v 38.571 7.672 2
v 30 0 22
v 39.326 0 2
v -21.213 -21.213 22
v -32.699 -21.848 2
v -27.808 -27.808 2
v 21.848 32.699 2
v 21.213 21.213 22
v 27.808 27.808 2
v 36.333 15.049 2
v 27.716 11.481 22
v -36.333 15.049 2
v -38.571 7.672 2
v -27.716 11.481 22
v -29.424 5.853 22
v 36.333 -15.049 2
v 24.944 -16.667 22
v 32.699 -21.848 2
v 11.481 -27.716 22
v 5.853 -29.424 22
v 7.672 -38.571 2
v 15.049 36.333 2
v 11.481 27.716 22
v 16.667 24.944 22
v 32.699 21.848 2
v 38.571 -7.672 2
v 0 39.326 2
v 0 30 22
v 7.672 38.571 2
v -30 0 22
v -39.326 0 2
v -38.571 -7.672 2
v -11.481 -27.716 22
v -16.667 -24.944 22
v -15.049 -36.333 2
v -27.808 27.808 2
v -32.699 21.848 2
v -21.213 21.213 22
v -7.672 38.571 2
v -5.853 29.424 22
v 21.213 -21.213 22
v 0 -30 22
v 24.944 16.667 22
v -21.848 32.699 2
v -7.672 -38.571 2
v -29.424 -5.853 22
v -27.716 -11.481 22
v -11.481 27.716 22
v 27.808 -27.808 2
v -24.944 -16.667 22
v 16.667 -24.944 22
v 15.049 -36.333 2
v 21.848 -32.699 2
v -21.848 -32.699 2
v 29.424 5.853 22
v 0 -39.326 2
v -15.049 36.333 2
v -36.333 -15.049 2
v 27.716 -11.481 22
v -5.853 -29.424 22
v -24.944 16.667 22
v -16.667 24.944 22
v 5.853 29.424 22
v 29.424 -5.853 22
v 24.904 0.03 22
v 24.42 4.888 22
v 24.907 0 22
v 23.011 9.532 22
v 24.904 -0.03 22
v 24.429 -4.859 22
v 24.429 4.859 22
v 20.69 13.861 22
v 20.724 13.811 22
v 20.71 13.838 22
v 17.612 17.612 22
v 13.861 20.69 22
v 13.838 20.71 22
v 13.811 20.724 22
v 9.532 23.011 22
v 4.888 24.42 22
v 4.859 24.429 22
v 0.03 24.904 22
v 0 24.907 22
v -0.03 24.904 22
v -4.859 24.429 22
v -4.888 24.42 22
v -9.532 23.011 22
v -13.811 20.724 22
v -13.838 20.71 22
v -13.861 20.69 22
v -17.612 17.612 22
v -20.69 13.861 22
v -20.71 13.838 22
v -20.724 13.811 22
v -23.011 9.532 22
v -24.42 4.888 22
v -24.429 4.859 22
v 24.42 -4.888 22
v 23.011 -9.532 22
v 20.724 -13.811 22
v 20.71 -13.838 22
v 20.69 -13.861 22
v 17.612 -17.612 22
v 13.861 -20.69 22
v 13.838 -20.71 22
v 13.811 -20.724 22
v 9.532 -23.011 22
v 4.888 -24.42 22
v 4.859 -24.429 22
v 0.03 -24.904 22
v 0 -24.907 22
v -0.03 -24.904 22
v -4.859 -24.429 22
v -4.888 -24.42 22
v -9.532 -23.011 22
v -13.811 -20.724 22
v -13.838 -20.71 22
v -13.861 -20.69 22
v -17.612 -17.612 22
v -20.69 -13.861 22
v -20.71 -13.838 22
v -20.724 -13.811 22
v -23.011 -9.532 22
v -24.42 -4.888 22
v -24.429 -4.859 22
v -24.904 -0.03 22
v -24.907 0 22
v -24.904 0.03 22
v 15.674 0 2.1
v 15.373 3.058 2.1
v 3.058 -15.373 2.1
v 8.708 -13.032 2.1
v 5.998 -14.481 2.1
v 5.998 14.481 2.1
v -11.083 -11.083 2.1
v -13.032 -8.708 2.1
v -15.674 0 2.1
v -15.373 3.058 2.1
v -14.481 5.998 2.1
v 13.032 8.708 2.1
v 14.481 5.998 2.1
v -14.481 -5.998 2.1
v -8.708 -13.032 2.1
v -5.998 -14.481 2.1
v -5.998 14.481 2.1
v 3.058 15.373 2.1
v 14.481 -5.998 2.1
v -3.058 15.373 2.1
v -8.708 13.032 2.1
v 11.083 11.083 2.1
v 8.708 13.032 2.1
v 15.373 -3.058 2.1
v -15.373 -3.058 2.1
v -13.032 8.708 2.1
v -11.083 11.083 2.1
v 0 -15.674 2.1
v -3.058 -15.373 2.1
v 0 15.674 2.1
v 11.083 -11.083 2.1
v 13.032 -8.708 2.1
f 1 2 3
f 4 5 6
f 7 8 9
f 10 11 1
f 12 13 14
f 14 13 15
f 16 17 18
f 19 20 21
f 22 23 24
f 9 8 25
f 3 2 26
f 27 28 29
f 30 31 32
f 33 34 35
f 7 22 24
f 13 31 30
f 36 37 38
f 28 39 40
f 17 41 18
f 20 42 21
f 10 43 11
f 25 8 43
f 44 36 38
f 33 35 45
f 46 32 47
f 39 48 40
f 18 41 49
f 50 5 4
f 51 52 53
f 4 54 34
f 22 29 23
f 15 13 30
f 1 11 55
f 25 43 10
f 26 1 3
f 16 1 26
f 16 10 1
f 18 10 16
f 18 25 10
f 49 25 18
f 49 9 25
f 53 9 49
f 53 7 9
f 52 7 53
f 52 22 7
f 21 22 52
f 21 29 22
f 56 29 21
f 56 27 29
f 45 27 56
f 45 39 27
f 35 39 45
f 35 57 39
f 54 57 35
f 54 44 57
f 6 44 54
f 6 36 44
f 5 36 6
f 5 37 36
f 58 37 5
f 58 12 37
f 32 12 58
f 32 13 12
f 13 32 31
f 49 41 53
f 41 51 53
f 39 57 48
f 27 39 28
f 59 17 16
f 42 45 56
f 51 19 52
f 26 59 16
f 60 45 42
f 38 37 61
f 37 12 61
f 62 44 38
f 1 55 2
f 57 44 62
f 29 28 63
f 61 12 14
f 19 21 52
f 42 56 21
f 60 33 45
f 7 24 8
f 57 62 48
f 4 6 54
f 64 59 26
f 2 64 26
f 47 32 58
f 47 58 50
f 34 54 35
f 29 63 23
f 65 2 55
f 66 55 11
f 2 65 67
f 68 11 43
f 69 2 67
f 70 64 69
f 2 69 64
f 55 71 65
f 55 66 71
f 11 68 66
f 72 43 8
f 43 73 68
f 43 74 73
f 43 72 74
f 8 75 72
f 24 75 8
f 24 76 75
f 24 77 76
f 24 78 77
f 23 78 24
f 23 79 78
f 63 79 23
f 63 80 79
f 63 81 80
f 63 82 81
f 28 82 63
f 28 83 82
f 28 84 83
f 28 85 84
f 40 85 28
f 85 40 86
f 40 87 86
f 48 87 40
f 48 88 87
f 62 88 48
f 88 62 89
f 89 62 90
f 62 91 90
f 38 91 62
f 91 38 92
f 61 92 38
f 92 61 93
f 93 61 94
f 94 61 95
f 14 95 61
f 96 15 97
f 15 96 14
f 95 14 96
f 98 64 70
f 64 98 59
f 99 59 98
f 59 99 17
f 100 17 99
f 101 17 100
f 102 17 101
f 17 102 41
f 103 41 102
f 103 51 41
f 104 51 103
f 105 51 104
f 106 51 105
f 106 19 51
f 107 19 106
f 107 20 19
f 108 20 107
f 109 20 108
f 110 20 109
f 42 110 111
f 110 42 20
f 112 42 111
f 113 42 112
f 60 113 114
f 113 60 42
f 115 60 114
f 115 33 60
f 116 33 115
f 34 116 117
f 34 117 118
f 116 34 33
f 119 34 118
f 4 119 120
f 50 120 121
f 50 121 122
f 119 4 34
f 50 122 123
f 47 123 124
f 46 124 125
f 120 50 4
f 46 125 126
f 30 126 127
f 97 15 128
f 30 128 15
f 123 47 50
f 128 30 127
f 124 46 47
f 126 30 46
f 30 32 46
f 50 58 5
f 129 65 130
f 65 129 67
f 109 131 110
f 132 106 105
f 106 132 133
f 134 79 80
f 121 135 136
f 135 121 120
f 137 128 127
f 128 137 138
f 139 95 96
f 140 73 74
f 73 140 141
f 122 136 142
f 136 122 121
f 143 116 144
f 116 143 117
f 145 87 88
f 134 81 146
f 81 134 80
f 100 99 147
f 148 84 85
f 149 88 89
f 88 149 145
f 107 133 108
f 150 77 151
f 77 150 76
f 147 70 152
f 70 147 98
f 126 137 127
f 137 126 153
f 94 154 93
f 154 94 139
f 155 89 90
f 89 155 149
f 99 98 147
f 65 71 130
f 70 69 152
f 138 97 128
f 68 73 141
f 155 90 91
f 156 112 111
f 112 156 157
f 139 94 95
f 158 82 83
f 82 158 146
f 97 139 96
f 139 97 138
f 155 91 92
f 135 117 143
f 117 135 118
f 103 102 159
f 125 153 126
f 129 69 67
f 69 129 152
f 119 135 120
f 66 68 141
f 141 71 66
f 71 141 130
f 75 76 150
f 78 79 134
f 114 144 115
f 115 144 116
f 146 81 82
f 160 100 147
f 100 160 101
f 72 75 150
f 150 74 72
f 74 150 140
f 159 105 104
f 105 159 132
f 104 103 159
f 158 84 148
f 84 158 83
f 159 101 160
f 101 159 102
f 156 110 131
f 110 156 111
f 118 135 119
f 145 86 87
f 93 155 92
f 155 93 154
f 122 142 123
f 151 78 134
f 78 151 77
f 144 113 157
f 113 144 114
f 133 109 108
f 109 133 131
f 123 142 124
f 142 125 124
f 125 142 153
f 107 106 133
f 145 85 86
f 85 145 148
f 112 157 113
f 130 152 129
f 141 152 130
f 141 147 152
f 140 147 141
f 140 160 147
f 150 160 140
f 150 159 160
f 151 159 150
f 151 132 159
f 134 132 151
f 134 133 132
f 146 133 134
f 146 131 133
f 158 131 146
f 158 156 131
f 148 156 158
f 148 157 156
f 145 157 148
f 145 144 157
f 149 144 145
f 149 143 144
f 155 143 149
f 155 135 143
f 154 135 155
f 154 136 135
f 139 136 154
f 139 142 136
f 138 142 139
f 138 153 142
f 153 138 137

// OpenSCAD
// file: oem/rplidar_a1m8_r1.scad
function vRPLidarA1M8R1Datasheet() =
     [["working_width", 6], ["range", 6000], ["laser_top_offset", 9], ["main_diameter", 70],
      ["connector_y_offset", 30], ["connector_width", 6], ["connector_length", 20],
      ["support_locations", [[-42, 20], [-42, -20], [28, 28], [28, -28]]]];


module mRPLidarA1M8R1() {
    translate([-13, 0, 25])
    rotate([90, 0, 180])
    translate([77.3244, -744.642, -132.9176])
    import("stl/RPLIDAR-A1M8-R1.stl");
}

mRPLidarA1M8R1();
// file: oem/m3_nut.scad
function vM3NutDatasheet() =
     [["e_min", 6.01], ["s_max", 5.5], ["m_max", 2.4]];


module mM3Nut() {
     import("stl/din934_m3_nut.stl");
}

mM3Nut();
// file: oem/m3x5mm_threaded_insert.scad
include <generic/lib.scad>;

function vM3x5mmThreadedInsertDatasheet() =
     let(major_diameter=5.31)
     [["major_diameter", major_diameter],
      ["minor_diameter", major_diameter - 0.5],
      ["nominal_diameter", 3], ["length", 5]];

module mM3x5mmThreadedInsertTaperCone() {
     datasheet = vM3x5mmThreadedInsertDatasheet();
     translate([0, 0, -property(datasheet, "length")])
     cylinder(d1=property(datasheet, "minor_diameter"),
              d2=property(datasheet, "major_diameter"),
              h=property(datasheet, "length") + kEpsilon);
}

module mM3x5mmThreadedInsert() {
     import("stl/m3x5mm_threaded_insert.stl");
}

mM3x5mmThreadedInsert();
// file: oem/m3_phillips_screw.scad
function vM3PhillipsScrewDatasheet() =
     [["nominal_diameter", 3], ["max_head_diameter", 6], ["max_head_height", 2.52]];

module mM3x6mmPhillipsScrew() {
     import("stl/m3x6mm_phillips_screw.stl");
}

module mM3x12mmPhillipsScrew() {
     import("stl/m3x12mm_phillips_screw.stl");
}

module mM3x20mmPhillipsScrew() {
     import("stl/m3x20mm_phillips_screw.stl");
}


mM3x12mmPhillipsScrew();
// file: oem/generic/lib.scad
$fn = 32;

kEpsilon = 1e-1;

function property(table, key) = table[search([key], table)[0]][1];

module sector(radius, angles, fn = $fn) {
     r = radius / cos(180 / fn);
     step = -360 / fn;

     points = concat([[0, 0]],
                     [for(a = [angles[0] : step : angles[1] - 360])
                               [r * cos(a), r * sin(a)]
                          ],
                     [[r * cos(angles[1]), r * sin(angles[1])]]
          );

     difference() {
          circle(radius, $fn = fn);
          polygon(points);
     }
}

module ring(inner_radius, outer_radius, angles = [0, 360], fn = $fn) {
     difference() {
          sector(radius=outer_radius, angles=angles, fn=fn);
          sector(radius=inner_radius, angles=angles+[-kEpsilon, kEpsilon], fn=fn);
     }
}

module rounded_ring(inner_radius, outer_radius, angles = [0, 360], fn = $fn) {
     step_angle = 360 / fn;
     ring_width = outer_radius - inner_radius;
     ring_mean_radius = (outer_radius + inner_radius) / 2;
     for (theta = angles) {
          theta_d = theta / step_angle;
          theta_frac = (theta_d - floor(theta_d) - 0.5) * step_angle;
          rho = ring_mean_radius * cos(step_angle/2) / cos(theta_frac);
          rotate(theta)
          translate([rho, 0])
          circle(d=ring_width);
     }
     ring(inner_radius=inner_radius,
          outer_radius=outer_radius,
          angles=angles, fn=fn);
}

module fillet(r) {
     difference() {
          difference() {
               offset(r=-r - kEpsilon)
                    offset(delta=r) {
                    children();
               }
               offset(r=r)
                    offset(delta=-r) {
                    children();
               }
          }
          children();
     }
     offset(r=r)
          offset(delta=-r) {
          children();
     }
}

module bench_fillet(r, order=1000) {
     difference() {
          fillet(r) {
               translate([-order/2-kEpsilon, 0]) {
                    square([order, order], center=true);
               }
               children();
          }
          translate([-order/2-kEpsilon, 0]) {
               square([order+kEpsilon, order+kEpsilon], center=true);
          }
     }
}

module curved_bench_fillet(r, bench_radius, order=1000, internal=true) {
     difference() {
          fillet(r) {
               if (internal) {
                    translate([bench_radius, 0]) {
                         ring(inner_radius=bench_radius + kEpsilon, outer_radius=bench_radius * order);
                    }
               } else {
                    translate([-bench_radius, 0]) circle(r=bench_radius - kEpsilon);
               }
               children();
          }
          if (internal) {
               translate([bench_radius, 0]) {
                    ring(inner_radius=bench_radius,
                         outer_radius=bench_radius * order - kEpsilon);
               }
          } else {
               translate([-bench_radius, 0]) circle(r=bench_radius);
          }

     }
}


module window(side, position=[0, 0, 0], order=1000) {
    difference() {
        children();
        translate(position)  {
            difference() {
                square(order, center=true);
                square(side, center=true);
            }
        }
    }
}


module rounded_cylinder(diameter, height, fillet_radius, center) {
     translate([0, 0, ! center ? height/2 : 0]) {
          minkowski() {
               cylinder(d=(diameter - 2 * fillet_radius),
                        h=(height - 2 * fillet_radius),
                        center=true);
               sphere(r=fillet_radius);
          }
     }
}


module curved_support_xsection(support_radius, fillet_radius,
                               wall_inner_radius, wall_outer_radius,
                               hole_radius = 0, internal=true) {
     support_angular_width = (4 * support_radius / wall_outer_radius) * 180 / PI;
     wall_thickness = wall_outer_radius - wall_inner_radius;
     rotate([0, 0, internal ? 180 : 0]) {
          difference() {
               window(6*support_radius) {
                    curved_bench_fillet(fillet_radius, bench_radius=wall_inner_radius, internal=internal) {
                         hull() {
                              translate([support_radius + wall_thickness/2, 0]) {
                                   circle(r=support_radius);
                              }
                              rotate([0, 0, ! internal ? 180 : 0])
                              translate([wall_inner_radius + wall_thickness/2, 0]) {
                                   ring(inner_radius=wall_inner_radius,
                                        outer_radius=wall_outer_radius,
                                        angles=[180 - support_angular_width/2,
                                                180 + support_angular_width/2]);
                              }
                         }
                         rotate([0, 0, ! internal ? 180 : 0])
                         translate([wall_inner_radius + wall_thickness/2, 0]) {
                              ring(inner_radius=wall_inner_radius,
                                   outer_radius=wall_outer_radius,
                                   angles=[180 - support_angular_width,
                                           180 + support_angular_width]);
                         }
                    }
               }
               if (hole_radius > 0) {
                    translate([support_radius + wall_thickness/2, 0]) {
                         circle(r=hole_radius);
                    }
               }
          }
     }
}

module fill(upto=1000) {
     offset(delta=-upto) {
          offset(delta=upto) {
               children();
          }
     }
}

module outline(delta) {
     if (delta > 0) {
          difference() {
               offset(delta=delta) {
                    children();
               }
               children();
          }
     } else {
          difference() {
               children();
               offset(delta=delta) {
                    children();
               }
          }
     }
}

module duplicate(v) {
     children();
     mirror(v) children();
}

function steps(start, end, n) = [start:(end - start)/(n - 1):end];

function sigmoid(x) = 1.0 / (1.0 + exp(-x));

module sigmoid_profile(length, width, order=10, fn = $fn) {
     step = length / fn;
     points = concat(
          [[0, 0]],
          [for (x = [step:step:length-step]) [x, width * sigmoid(2 * order * ((x / length) - 0.5))]],
          [[length, width], [0, width]]

     );
     polygon(points=points);
}

module exp_nerve_xsection(height, length, decay_rate = 5, fn = $fn) {
     step = length / fn;
     points = concat(
          [[0, 0]],
          [for (x = [0:step:length-step]) [x, height * exp(-x/decay_rate)]],
          [[length, 0]]
          );
     polygon(points=points);
}

module exp_nerve(height, length, thickness, decay_rate = 3, fn = $fn) {
     rotate([90, 0, 0])
     linear_extrude(height=thickness, center=true) {
          exp_nerve_xsection(height, length, decay_rate, fn);
     }
}

module exp_corner_nerve(height, radius, angles, corner_radius = 0, decay_rate = 3, fn = $fn) {
     difference() {
          rotate_extrude() {
               if (corner_radius > 0) {
                    translate([corner_radius, 0, 0])
                    exp_nerve_xsection(height=height, length=radius, decay_rate=decay_rate, fn=fn);
               } else {
                    translate([-corner_radius, 0, 0])
                    mirror([1, 0, 0])
                    exp_nerve_xsection(height=height, length=radius, decay_rate=decay_rate, fn=fn);
               }
          }
          linear_extrude(height=2 * height, center=true) {
               sector(radius=radius + abs(corner_radius), angles=[angles[1], angles[0] + 360], fn=fn);
          }
     }
}
// file: chassis_base_cover.scad
include <generic/lib.scad>;

use <oem/16mm_led_pushbutton.scad>;
use <oem/m3_phillips_screw.scad>;
use <oem/m3x5mm_threaded_insert.scad>;
use <oem/m3_nut.scad>;

use <oem/rplidar_a1m8_r1.scad>;
use <oem/sma_female_bulkhead_connector.scad>;
use <oem/usb_type_a_panel_connector.scad>;

use <chassis_base.scad>;


function vChassisBaseCoverDatasheet() =
     let(chassis_datasheet=vChassisBaseDatasheet(),
         chassis_outer_diameter=property(chassis_datasheet, "outer_diameter"),
         chassis_inner_diameter=property(chassis_datasheet, "inner_diameter"),
         chassis_fillet_radius=property(chassis_datasheet, "fillet_radius"),
         min_thickness=property(chassis_datasheet, "thickness"),
         lidar_datasheet=vRPLidarA1M8R1Datasheet(),
         bay_height=property(lidar_datasheet, "working_width") + 2,
         height=(property(chassis_datasheet, "height") -
                 property(chassis_datasheet, "base_height") -
                 bay_height),
         support_diameter=10, wireway_width=20, wireway_conduit_width=25,
         outer_wireway_radius=chassis_outer_diameter/2 - support_diameter - chassis_fillet_radius,
         inner_wireway_radius=outer_wireway_radius - wireway_width,
         inner_diameter=property(lidar_datasheet, "main_diameter") + 2,
         sma_conn_datasheet=vSMAFemaleBulkheadConnectorDatasheet(),
         sma_conn_thread_length=property(sma_conn_datasheet, "thread_length"),
         sma_conn_locations=[let(wireway_conduit_angular_width=2 * asin(wireway_conduit_width / (2 * inner_wireway_radius)))
                             for(angle = [-135, 135]) let(corner_angle=angle - sign(angle) * wireway_conduit_angular_width/2)
                             [inner_wireway_radius * cos(corner_angle) - sign(cos(angle)) * sma_conn_thread_length,
                              inner_wireway_radius * sin(corner_angle), height/2]])
     [["height", height], ["bay_height", bay_height], ["panel_length", 40], ["panel_width", 80], ["panel_angular_offset", 0],
      ["panel_r_offset", -chassis_outer_diameter/4], ["outer_wireway_radius", outer_wireway_radius],
      ["inner_wireway_radius", inner_wireway_radius], ["inner_diameter", inner_diameter],
      ["wireway_conduit_angles", [-135, -45, 45, 135]],
      ["wireway_conduit_width", wireway_conduit_width], ["wireway_width", wireway_width],
      ["support_angles", [-165, -135, -105, -75, 75, 105, 135, 165]], ["bay_support_angles", [-90, 90, 180]],
      ["support_r_offset", chassis_inner_diameter/2 - support_diameter/2],
      ["support_diameter", support_diameter], ["fastening_angles", [0, 90, 180, 270]],
      ["fastening_r_offset", [inner_wireway_radius - support_diameter/2 - min_thickness,
                              inner_diameter/2 + min_thickness + support_diameter/2]],
      ["sma_conn_locations", sma_conn_locations],
      ["pole_block_diameter", 60], ["pole_block_taper_angle", 25],
      ["pole_socket_diameter",50], ["pole_socket_taper_angle", 25],
      ["pole_socket_depth", 20], ["min_thickness", min_thickness]];


function vChassisCoverSupportScrewDatasheet() = vM3PhillipsScrewDatasheet();
// file: chassis_base.scad
include <generic/lib.scad>;

function vChassisBaseDatasheet() =
     let(outer_diameter=400, thickness=2, inner_diameter=outer_diameter - 2 * thickness,
         base_height=109.5, height=133, inner_height=height - 2 * thickness)
     [["outer_diameter", outer_diameter], ["inner_diameter", inner_diameter],
      ["base_height", base_height], ["height", height], ["inner_height", inner_height],
      ["thickness", thickness], ["support_diameter", 10], ["z_offset", 20], ["fillet_radius", 4]];

module mChassisOuterVolume() {
     datasheet = vChassisBaseDatasheet();
     rounded_cylinder(diameter=property(datasheet, "outer_diameter"),
                      height=property(datasheet, "height"),
                      fillet_radius=property(datasheet, "fillet_radius"));
}

module mChassisInnerVolume() {
     datasheet = vChassisBaseDatasheet();
     translate([0, 0, property(datasheet, "thickness")]) {
          rounded_cylinder(diameter=property(datasheet, "inner_diameter"),
                           height=property(datasheet, "inner_height"),
                           fillet_radius=property(datasheet, "fillet_radius"));
     }
}

module mChassisBBox() {
     datasheet = vChassisBaseDatasheet();
     chassis_height = property(datasheet, "height");
     chassis_outer_diameter = property(datasheet, "outer_diameter");
     translate([0., 0., chassis_height/2]) {
          cube([chassis_outer_diameter, chassis_outer_diameter, chassis_height], center=true);
     }
}

module mChassisShell() {
     difference() {
          mChassisOuterVolume();
          mChassisInnerVolume();
     }
}

module mChassisVolumeConstrain() {
     datasheet = vChassisBaseDatasheet();
     height = property(datasheet, "height");
     outer_diameter = property(datasheet, "outer_diameter");
     fillet_radius = property(datasheet, "fillet_radius");
     difference() {
          rounded_cylinder(diameter=outer_diameter,
                           height=height,
                           fillet_radius=fillet_radius);
          difference() {
               translate([0, 0, -kEpsilon]) {
                    rounded_cylinder(diameter=outer_diameter + kEpsilon,
                                     height=height + 2 * kEpsilon,
                                     fillet_radius=fillet_radius);
               }
               children();
          }
     }
}
// file: oem/usb_type_a_panel_connector.scad
include <generic/lib.scad>;


function vUSBTypeAPanelConnectorDatasheet() =
     [["conn_height", 16.8], ["cutout_length", 12.3], ["cutout_width", 26.5],
      ["flare_height", 4.5], ["flare_length", 18], ["flare_width", 30.31]];


module mUSBTypeAPanelConnector() {
     module mUSBTypeAFemaleConnector() {
          rotate([0, 0, 90]) {
               translate([-53.92913818, 0.57096958, 0.19999933]) {
                    import("stl/usb_type_a_female_connector.stl");
               }
          }
     }

     datasheet = vUSBTypeAPanelConnectorDatasheet();
     flare_height = property(datasheet, "flare_height");
     flare_length = property(datasheet, "flare_length");
     flare_width = property(datasheet, "flare_width");
     linear_extrude(height=flare_height) {
          difference() {
               square([flare_length, flare_width], center=true);
               hull() projection() mUSBTypeAFemaleConnector();
          }
     }
     conn_height = property(datasheet, "conn_height");
     translate([0, 0, flare_height-conn_height/2]) {
          mUSBTypeAFemaleConnector();
     }
}


mUSBTypeAPanelConnector();
// file: oem/sma_female_bulkhead_connector.scad
function vSMAFemaleBulkheadConnectorDatasheet() =
     [["thread_length", 11], ["thread_diameter", 6.4]];

module mSMAFemaleBulkheadConnectorCutuotSection() {
     difference() {
          circle(d=6.4);
          translate([0, -6.0, 0]) {
               square(6.4, center=true);
          }
     }
}


module mSMAFemaleBulkheadConnector() {
     rotate([0, 0, 90]) {
          translate ([0, 0, -12.5]) {
               rotate([0, -90, 0]) {
                    scale([25.4, 25.4, 25.4]) {  // inch to mm
                         import("stl/sma_female_bulkhead_connector.stl");
                    }
               }
          }
     }
}


mSMAFemaleBulkheadConnector();
// file: oem/16mm_led_pushbutton.scad
function v16mmLEDPushbuttonDatasheet() = [["cutout_diameter", 16]];


module m16mmLEDPushbutton() {
     rotate([0, 0, -90]) import("stl/16mm_led_pushbutton.stl");
}
// main file
include <generic/lib.scad>;

use <oem/16mm_led_pushbutton.scad>;
use <oem/sma_female_bulkhead_connector.scad>;
use <oem/usb_type_a_panel_connector.scad>;

use <chassis_base.scad>;
use <chassis_base_cover.scad>;


module mChassisCover_PartB() {
     datasheet = vChassisBaseCoverDatasheet();
     height = property(datasheet, "height");
     inner_diameter = property(datasheet, "inner_diameter");
     min_thickness = property(datasheet, "min_thickness");
     support_diameter = property(datasheet, "support_diameter");

     chassis_datasheet = vChassisBaseDatasheet();
     chassis_height = property(chassis_datasheet, "height");
     chassis_outer_diameter = property(chassis_datasheet, "outer_diameter");
     chassis_fillet_radius = property(chassis_datasheet, "fillet_radius");

     outer_wireway_radius = property(datasheet, "outer_wireway_radius");
     inner_wireway_radius = property(datasheet, "inner_wireway_radius");

     support_angles = property(datasheet, "support_angles");
     support_r_offset = property(datasheet, "support_r_offset");
     bay_support_angles = property(datasheet, "bay_support_angles");

     pole_socket_depth = property(datasheet, "pole_socket_depth");
     pole_socket_diameter = property(datasheet, "pole_socket_diameter");
     pole_socket_taper_angle = property(datasheet, "pole_socket_taper_angle");
     pole_block_diameter = property(datasheet, "pole_block_diameter");
     pole_block_taper_angle = property(datasheet, "pole_block_taper_angle");

     panel_depth = property(datasheet, "panel_depth");
     panel_length = property(datasheet, "panel_length");
     panel_width = property(datasheet, "panel_width");
     panel_angular_offset = property(datasheet, "panel_angular_offset");
     panel_r_offset = property(datasheet, "panel_r_offset");

     pushbutton_cutout_diameter = property(v16mmLEDPushbuttonDatasheet(), "cutout_diameter");

     usb_conn_datasheet = vUSBTypeAPanelConnectorDatasheet();
     usb_conn_cutout_length = property(usb_conn_datasheet, "cutout_length");
     usb_conn_cutout_width = property(usb_conn_datasheet, "cutout_width");

     screw_datasheet = vChassisCoverSupportScrewDatasheet();
     screw_nominal_diameter = property(screw_datasheet, "nominal_diameter");
     screw_max_head_diameter = property(screw_datasheet, "max_head_diameter");

     render() {
          /* difference() { */
          /*      linear_extrude(height=min_thickness) { */
          /*           difference() { */
          /*                circle(r=inner_wireway_radius); */
          /*                rotate([0, 0, panel_angular_offset]) { */
          /*                     translate([panel_r_offset, 0, 0]) { */
          /*                          rotate([0, 0, -90]) { */
          /*                               circle(d=pushbutton_cutout_diameter); */
          /*                               duplicate([0, 1, 0]) { */
          /*                                    translate([0, (panel_width + pushbutton_cutout_diameter)/4]) { */
          /*                                         translate([-usb_conn_cutout_width/2, -usb_conn_cutout_length/2]) { */
          /*                                              square([usb_conn_cutout_width, usb_conn_cutout_length]); */
          /*                                         } */
          /*                                    } */
          /*                               } */
          /*                          } */
          /*                     } */
          /*                } */
          /*                for(angle = property(datasheet, "fastening_angles")) { */
          /*                     for (r_offset = property(datasheet, "fastening_r_offset")) { */
          /*                          rotate([0, 0, angle]) { */
          /*                               translate([r_offset, 0]) { */
          /*                                    circle(d=screw_nominal_diameter); */
          /*                               } */
          /*                          } */
          /*                     } */
          /*                } */
          /*                circle(d=screw_nominal_diameter); */
          /*           } */
          /*      } */
          /*      translate([0, 0, min_thickness/2]) { */
          /*           linear_extrude(height=min_thickness/2) { */
          /*                for (angle = [-120, 0, 120]) { */
          /*                     rotate([0, 0, angle]) { */
          /*                          translate([inner_diameter, 0]) { */
          /*                               wifi_logo(10); */
          /*                          } */
          /*                     } */
          /*                } */
          /*           } */
          /*      } */
          /* } */
          translate([0, 0, min_thickness]) {
               let(pole_block_major_diameter=pole_block_diameter + 2 * pole_socket_depth * tan(pole_block_taper_angle),
                   pole_block_minor_diameter=pole_block_diameter, pole_socket_major_diameter=pole_socket_diameter,
                   pole_socket_minor_diameter=pole_socket_diameter - 2 * pole_socket_depth * tan(pole_socket_taper_angle)) {
                    difference() {
                         cylinder(d1=pole_block_major_diameter,
                                  d2=pole_block_minor_diameter,
                                  h=pole_socket_depth);
                         translate([0, 0, kEpsilon]) {
                              cylinder(d1=pole_socket_minor_diameter,
                                       d2=pole_socket_major_diameter,
                                       h=pole_socket_depth + kEpsilon);
                         }

                    }
               }
          }
     }
}

mChassisCover_PartB();
